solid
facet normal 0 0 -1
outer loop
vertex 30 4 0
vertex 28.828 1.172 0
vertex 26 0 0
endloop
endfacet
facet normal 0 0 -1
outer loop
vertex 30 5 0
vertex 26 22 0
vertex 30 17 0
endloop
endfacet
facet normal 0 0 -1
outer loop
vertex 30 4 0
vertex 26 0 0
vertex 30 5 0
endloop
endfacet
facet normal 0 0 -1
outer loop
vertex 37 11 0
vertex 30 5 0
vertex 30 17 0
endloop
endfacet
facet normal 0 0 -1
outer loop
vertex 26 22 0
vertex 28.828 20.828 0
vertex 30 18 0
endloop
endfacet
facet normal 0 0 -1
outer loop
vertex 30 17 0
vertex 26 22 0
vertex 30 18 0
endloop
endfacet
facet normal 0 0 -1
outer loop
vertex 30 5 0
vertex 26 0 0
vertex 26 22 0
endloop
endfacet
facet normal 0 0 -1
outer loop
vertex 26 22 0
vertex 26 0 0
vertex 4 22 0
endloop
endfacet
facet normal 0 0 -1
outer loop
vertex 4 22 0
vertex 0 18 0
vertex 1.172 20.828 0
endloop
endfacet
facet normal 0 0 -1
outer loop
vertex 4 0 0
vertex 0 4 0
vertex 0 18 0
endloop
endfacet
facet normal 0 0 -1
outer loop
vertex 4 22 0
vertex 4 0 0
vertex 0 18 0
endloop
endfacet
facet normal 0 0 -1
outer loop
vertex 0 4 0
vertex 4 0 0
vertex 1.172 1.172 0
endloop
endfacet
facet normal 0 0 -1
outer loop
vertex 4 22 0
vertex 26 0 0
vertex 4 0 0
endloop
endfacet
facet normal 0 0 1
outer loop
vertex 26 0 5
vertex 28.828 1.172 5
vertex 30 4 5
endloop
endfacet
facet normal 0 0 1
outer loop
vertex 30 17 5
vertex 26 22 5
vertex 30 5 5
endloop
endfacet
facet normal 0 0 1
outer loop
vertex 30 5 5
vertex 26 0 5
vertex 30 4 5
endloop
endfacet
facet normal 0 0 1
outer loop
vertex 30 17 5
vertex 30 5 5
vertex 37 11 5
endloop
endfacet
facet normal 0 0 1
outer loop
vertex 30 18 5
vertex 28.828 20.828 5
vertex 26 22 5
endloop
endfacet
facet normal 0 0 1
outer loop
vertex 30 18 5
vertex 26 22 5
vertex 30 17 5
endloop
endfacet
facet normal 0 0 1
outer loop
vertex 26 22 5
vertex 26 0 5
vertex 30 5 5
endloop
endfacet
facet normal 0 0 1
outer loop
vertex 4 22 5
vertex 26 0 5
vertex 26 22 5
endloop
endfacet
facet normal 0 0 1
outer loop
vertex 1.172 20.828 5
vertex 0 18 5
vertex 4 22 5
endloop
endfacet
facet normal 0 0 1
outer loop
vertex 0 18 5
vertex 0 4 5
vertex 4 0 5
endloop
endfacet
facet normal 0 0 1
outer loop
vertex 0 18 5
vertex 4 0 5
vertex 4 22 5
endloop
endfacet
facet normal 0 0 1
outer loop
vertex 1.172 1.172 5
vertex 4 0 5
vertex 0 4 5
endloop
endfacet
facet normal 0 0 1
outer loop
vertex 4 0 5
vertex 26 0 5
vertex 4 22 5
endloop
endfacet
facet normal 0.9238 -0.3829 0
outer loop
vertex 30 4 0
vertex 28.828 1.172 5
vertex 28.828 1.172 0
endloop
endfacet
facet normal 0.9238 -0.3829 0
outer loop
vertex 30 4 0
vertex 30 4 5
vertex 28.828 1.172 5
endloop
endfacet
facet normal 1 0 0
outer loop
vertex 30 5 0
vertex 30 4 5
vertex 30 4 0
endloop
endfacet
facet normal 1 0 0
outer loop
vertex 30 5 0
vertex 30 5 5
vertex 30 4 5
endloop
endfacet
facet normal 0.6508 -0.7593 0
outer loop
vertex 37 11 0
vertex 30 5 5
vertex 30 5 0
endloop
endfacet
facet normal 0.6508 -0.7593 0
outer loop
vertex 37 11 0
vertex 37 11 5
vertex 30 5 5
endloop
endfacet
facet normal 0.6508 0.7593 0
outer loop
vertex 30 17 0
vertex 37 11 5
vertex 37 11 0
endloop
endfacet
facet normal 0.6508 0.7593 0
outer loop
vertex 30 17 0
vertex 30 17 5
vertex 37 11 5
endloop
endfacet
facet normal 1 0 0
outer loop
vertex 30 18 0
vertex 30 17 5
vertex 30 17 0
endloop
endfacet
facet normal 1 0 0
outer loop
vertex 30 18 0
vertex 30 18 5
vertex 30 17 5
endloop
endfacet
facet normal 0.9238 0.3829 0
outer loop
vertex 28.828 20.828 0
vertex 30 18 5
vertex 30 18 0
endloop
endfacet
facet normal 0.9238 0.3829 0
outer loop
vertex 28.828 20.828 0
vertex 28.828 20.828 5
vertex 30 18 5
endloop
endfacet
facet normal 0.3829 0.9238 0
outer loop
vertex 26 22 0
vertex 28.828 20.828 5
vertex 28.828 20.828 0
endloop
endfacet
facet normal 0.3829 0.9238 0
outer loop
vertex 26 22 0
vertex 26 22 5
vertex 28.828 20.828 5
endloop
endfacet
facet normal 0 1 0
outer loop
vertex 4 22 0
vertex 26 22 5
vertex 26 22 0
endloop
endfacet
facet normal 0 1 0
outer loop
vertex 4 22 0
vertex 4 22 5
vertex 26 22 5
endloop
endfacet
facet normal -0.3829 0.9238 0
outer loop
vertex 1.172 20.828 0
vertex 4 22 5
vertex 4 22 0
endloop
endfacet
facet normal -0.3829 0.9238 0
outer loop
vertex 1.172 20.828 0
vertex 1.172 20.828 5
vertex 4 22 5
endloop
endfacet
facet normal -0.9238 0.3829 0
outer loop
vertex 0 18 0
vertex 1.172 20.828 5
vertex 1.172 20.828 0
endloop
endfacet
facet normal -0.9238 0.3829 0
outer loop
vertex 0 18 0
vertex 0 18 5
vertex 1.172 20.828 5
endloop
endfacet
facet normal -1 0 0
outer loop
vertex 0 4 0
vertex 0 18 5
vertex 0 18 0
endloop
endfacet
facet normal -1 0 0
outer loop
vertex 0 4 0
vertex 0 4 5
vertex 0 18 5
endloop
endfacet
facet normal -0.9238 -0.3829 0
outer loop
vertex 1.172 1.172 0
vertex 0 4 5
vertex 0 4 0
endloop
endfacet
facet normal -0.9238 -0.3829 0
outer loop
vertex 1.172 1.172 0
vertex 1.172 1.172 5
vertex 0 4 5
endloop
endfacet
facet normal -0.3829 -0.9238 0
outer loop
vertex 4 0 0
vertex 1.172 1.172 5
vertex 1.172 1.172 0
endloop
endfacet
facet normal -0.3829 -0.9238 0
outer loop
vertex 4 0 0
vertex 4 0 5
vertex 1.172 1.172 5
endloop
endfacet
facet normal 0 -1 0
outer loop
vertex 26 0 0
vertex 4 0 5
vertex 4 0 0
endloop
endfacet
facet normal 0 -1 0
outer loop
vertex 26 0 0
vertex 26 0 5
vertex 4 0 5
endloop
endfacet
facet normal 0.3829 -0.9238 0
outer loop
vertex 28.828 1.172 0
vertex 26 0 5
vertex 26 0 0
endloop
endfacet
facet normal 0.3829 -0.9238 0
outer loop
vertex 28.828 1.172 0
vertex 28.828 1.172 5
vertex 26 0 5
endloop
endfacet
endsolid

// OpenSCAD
$fn = 32;

// ----------------------------------------------------------------------
// Ratchet pawl: 30 x 22 mm body, beak 7 mm с правого торца
// ----------------------------------------------------------------------

// --- parameters (mm) ---
profile_height = 5;       // extrusion height
profile_points = 15;      // points of the closed outline

profile = [[0, 4], [1.172, 1.172], [4, 0], [26, 0], [28.828, 1.172], [30, 4], [30, 5], [37, 11], [30, 17], [30, 18], [28.828, 20.828], [26, 22], [4, 22], [1.172, 20.828], [0, 18]];  // single closed polygon, 15 points, counter clockwise

// --- the one profile operation ---
linear_extrude(height = profile_height) polygon(points = profile);
